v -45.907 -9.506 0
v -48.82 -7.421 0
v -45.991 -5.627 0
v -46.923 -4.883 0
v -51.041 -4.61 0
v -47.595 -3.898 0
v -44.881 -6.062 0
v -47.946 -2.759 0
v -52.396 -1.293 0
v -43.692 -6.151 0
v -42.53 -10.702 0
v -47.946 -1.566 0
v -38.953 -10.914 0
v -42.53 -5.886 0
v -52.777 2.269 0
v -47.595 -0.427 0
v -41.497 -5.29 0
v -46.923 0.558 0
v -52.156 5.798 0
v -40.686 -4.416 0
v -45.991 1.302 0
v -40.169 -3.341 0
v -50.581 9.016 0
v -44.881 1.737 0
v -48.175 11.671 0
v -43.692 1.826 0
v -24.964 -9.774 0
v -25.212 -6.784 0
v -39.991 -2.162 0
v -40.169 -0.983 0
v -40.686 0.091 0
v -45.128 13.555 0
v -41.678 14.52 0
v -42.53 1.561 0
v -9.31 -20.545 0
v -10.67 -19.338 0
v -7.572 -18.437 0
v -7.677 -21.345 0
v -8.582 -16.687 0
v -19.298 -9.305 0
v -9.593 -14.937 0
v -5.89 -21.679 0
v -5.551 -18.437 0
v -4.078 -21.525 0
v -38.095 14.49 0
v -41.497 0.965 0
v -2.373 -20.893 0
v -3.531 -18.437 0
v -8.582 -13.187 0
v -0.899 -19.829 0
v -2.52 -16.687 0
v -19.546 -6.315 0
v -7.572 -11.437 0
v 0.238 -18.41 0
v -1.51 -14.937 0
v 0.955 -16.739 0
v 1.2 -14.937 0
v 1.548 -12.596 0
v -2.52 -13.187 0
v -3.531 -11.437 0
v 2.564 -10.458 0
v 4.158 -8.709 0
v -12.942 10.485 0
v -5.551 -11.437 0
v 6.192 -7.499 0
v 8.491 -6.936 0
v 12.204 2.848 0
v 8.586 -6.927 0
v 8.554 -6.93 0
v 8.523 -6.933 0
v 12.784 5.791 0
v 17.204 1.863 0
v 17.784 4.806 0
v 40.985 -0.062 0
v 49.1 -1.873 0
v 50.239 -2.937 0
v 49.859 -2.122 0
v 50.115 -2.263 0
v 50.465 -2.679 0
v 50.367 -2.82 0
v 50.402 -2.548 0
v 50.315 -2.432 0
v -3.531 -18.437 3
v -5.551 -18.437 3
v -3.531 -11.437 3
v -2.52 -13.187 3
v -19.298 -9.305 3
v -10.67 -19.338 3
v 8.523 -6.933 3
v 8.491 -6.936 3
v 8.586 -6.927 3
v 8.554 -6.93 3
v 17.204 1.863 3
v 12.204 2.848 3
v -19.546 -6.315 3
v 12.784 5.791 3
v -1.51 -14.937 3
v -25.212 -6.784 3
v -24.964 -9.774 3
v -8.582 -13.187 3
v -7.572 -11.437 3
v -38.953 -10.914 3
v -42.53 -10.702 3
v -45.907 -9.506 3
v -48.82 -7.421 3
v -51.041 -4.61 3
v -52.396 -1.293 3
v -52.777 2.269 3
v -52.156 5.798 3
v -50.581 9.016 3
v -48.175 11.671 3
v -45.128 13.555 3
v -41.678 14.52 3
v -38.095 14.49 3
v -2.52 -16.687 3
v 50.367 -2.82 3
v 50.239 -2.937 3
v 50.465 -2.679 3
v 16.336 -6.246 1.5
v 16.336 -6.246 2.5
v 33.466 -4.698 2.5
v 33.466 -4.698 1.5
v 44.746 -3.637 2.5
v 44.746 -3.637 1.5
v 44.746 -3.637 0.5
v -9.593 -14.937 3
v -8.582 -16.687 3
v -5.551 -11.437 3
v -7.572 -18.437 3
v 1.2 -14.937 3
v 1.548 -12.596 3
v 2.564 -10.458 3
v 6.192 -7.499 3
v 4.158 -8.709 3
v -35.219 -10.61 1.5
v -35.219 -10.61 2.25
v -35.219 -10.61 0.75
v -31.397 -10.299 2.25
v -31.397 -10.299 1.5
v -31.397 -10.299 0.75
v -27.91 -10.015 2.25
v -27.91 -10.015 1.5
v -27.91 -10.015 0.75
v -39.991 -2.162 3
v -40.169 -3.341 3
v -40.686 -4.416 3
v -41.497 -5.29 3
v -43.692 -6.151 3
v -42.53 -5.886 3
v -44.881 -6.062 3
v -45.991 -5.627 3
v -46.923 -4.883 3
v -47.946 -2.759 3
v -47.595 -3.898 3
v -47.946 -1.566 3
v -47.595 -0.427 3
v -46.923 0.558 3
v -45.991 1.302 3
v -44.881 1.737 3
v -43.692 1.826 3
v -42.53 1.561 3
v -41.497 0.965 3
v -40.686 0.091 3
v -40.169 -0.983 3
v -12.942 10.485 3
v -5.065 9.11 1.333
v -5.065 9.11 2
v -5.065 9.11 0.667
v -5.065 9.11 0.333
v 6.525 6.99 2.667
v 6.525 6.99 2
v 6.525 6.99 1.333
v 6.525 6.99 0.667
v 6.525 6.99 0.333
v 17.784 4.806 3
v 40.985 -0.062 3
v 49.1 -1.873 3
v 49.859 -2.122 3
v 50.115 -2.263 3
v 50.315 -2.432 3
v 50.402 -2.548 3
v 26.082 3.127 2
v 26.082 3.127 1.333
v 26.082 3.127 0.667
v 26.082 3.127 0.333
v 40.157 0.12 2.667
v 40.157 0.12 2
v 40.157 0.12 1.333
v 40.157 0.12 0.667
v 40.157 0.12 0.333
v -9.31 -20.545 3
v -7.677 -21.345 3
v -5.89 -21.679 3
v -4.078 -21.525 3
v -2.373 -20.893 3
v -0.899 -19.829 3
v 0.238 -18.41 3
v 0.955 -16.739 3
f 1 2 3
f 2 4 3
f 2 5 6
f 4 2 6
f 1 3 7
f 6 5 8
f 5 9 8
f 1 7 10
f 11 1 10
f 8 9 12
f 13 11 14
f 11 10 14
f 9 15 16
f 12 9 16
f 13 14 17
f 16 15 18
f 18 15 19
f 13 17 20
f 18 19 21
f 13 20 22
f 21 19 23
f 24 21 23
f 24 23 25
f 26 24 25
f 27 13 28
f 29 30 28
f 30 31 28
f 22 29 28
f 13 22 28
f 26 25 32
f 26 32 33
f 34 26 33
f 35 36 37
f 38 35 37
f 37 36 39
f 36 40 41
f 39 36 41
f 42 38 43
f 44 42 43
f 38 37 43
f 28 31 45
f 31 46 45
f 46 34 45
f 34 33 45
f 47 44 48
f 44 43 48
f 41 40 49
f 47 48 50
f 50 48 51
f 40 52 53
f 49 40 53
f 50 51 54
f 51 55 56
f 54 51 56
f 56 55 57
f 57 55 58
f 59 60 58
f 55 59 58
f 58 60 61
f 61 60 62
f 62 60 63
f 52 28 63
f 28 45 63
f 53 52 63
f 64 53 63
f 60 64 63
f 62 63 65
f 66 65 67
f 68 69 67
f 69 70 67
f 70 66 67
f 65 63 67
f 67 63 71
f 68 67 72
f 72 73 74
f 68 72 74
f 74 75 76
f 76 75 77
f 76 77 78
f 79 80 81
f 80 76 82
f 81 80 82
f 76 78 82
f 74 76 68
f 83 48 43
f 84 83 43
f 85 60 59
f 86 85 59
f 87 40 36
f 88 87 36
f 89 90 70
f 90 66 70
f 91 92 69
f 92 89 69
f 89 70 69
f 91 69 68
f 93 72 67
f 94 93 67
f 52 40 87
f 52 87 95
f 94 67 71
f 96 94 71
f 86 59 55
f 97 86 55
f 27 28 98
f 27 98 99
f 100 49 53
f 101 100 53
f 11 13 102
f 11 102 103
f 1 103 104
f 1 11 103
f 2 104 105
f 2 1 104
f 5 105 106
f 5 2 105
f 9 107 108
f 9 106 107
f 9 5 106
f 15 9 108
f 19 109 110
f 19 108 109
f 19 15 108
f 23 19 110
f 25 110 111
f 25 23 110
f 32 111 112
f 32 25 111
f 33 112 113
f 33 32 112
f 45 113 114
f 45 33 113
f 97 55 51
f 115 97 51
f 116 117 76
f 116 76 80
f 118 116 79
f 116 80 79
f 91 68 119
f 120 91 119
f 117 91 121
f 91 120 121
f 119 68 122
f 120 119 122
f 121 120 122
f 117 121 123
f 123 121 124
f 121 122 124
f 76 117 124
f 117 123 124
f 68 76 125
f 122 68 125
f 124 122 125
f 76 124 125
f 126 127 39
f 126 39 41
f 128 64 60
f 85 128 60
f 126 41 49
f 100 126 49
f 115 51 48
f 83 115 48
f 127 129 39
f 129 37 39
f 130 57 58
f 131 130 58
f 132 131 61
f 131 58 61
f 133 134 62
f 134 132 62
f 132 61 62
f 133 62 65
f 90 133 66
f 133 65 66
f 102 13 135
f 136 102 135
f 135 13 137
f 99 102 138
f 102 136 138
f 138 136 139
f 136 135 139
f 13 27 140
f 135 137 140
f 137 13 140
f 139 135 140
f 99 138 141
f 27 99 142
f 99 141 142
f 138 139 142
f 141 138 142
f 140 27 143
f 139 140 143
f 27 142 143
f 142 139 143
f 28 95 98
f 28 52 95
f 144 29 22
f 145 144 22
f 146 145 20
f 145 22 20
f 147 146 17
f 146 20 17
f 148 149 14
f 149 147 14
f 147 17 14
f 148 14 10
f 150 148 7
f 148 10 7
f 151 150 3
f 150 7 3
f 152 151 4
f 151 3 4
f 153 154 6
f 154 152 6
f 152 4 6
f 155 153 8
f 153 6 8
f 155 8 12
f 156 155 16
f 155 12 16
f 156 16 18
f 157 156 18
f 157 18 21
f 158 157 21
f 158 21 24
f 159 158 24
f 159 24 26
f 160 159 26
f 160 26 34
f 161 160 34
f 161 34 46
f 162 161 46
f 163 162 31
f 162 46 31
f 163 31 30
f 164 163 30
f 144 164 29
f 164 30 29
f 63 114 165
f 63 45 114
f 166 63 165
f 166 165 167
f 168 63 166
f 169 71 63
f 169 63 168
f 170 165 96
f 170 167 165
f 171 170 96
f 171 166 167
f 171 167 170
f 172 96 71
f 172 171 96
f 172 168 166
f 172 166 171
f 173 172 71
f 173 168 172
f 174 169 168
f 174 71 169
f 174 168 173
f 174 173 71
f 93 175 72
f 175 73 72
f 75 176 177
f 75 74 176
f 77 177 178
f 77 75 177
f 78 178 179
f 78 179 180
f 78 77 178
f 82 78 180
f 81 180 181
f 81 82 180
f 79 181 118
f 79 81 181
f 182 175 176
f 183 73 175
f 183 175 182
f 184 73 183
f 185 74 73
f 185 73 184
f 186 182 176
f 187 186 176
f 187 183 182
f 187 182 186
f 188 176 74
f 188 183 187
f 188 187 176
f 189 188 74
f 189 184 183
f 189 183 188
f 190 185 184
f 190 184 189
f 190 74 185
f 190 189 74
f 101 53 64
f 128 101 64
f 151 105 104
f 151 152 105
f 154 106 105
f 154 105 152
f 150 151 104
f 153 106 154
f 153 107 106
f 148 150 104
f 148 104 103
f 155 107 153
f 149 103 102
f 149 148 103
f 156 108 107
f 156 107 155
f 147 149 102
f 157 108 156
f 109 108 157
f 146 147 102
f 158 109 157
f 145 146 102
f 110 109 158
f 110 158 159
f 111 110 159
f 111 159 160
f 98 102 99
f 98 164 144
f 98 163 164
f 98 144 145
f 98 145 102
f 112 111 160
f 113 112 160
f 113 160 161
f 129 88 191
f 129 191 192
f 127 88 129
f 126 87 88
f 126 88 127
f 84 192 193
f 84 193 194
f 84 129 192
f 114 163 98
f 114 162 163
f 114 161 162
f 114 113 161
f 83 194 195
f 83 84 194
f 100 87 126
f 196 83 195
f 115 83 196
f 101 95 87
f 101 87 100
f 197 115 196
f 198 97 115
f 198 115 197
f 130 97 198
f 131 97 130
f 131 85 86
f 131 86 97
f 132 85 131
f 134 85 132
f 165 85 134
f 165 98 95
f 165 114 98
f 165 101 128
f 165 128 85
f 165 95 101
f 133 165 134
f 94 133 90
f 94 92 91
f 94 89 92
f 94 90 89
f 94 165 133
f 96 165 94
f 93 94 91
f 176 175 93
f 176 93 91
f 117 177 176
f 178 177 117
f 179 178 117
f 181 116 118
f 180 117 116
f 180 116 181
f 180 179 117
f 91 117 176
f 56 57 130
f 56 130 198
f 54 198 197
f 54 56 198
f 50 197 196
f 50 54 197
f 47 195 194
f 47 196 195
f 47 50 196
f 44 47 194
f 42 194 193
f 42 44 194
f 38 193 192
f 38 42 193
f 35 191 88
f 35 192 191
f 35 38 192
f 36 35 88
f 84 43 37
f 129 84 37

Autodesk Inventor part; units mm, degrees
ref_plane "YZ Plane" through (0, 0, 0) normal (1, 0, 0) x (0, 1, 0)
ref_plane "XZ Plane" through (0, 0, 0) normal (0, 1, 0) x (-1, 0, 0)
ref_plane "XY Plane" through (0, 0, 0) normal (0, 0, 1) x (1, 0, 0)
sketch "Sketch1" plane through (0, 0, 0) normal (0, 0, 1) x (1, 0, 0)
  spline S0 degree 2 poles (-26.5248, 6.4808) (-26.4161, 6.4647) (-26.3074, 6.4486) knots 0 0 0 1 1 1
  line L0 (-26.3296, 6.4519) -> (-26.2853, 6.4453) construction
  arc A0 (-26.2897, 6.4459) -> (-26.3252, 6.4512) centre (-41.887, -98.3753) ccw construction
  line L1 (-25.2117, -6.7841) -> (-24.9641, -9.7739)
  line L2 (-24.9641, -9.7739) -> (-19.2983, -9.3048)
  line L3 (-19.2983, -9.3048) -> (-19.5458, -6.315)
  line L4 (12.2044, 2.8479) -> (12.7843, 5.7913)
  line L5 (17.2044, 1.8628) -> (12.2044, 2.8479)
  line L6 (17.7843, 4.8062) -> (17.2044, 1.8628)
  line L7 (12.7843, 5.7913) -> (17.7843, 4.8062)
  spline S1 degree 4 poles (-38.0951, 14.4901) (-32.9548, 13.7199) (-24.3789, 12.4143) (-13.058, 10.5436) (0.6417, 8.1052) (11.6287, 6.041) (21.387, 4.092) (29.8346, 2.3727) (36.815, 0.808) (43.6252, -0.5644) (47.6422, -1.771) (50.1605, -1.8369) (50.4649, -2.6789) knots 0 0 0 0 0 0.183688 0.302378 0.416104 0.523956 0.624947 0.717922 0.80148 0.87369 1 1 1 1 1
  line L8 (-19.5458, -6.315) -> (-25.2117, -6.7841)
  arc A1 (-38.0951, 14.4901) -> (-38.9531, -10.9139) centre (-39.9909, 1.8376) ccw
  line L9 (-39.9909, 1.8376) -> (-39.9909, -2.1624)
  line L10 (-39.9909, -2.1624) -> (-43.9909, -2.1624)
  circle A2 centre (-43.9909, -2.1624) radius 4
  arc A3 (-10.6702, -19.3385) -> (1.1997, -14.9369) centre (-5.5514, -14.9369) ccw
  circle A4 centre (-5.5514, -14.9369) radius 3.5
  line L11 (-19.2983, -9.3048) -> (-10.6702, -19.3385)
  arc A5 (8.586, -6.9273) -> (1.1997, -14.9369) centre (9.2356, -14.9369) ccw
  spline S2 degree 4 poles (-38.9531, -10.9139) (-33.23, -10.4482) (-24.9952, -9.78) (-22.9103, -9.6058) (-19.2983, -9.3048) knots 0 0 0 0 0 1 1 1 1 1
  spline S3 degree 4 poles (8.4911, -6.9355) (10.4946, -6.7611) (14.9368, -6.3715) (21.4309, -5.7906) (29.3954, -5.096) (36.4972, -4.392) (43.4136, -3.8797) (47.5475, -3.2083) (50.0497, -3.468) (50.4649, -2.6789) knots 0.442408 0.442408 0.442408 0.442408 0.442408 0.523404 0.624432 0.717481 0.801136 0.873452 1 1 1 1 1
  line L12 (-21.2865, -9.4705) -> (-17.3101, -9.139) construction
  arc A6 (-17.7077, -9.1723) -> (-20.8888, -9.4375) centre (811.3613, -9974.7453) ccw construction
  line L13 (3.8187, -7.3423) -> (13.1635, -6.5288) construction
  arc A7 (4.7531, -7.2593) -> (12.2289, -6.6085) centre (-354.4003, 4161.6553) ccw construction
  line L14 (-1.5099, -14.9369) -> (-3.5307, -18.4369)
  line L15 (-3.5307, -18.4369) -> (-7.5721, -18.4369)
  line L16 (-7.5721, -18.4369) -> (-9.5928, -14.9369)
  line L17 (-9.5928, -14.9369) -> (-7.5721, -11.4369)
  line L18 (-7.5721, -11.4369) -> (-3.5307, -11.4369)
  line L19 (-3.5307, -11.4369) -> (-1.5099, -14.9369)
  point P0 (0, 0)
  point P1 (-3.4702, -1.6741)
  point P2 (-11.7791, -8.6729)
  point P3 (0.4579, -7.6289)
  point P4 (30.1549, -5.0069)
  point P5 (37.3429, -4.3499)
  point P6 (43.0189, -3.8219)
  point P7 (47.1229, -3.4349)
  point P8 (49.6039, -3.1979)
  point P9 (-24.1061, 12.3331)
  point P10 (-10.9541, 10.1431)
  point P11 (1.2109, 7.9771)
  point P12 (12.2659, 5.8921)
  point P13 (22.0909, 3.9421)
  point P14 (30.5809, 2.1811)
  point P15 (37.6519, 0.6571)
  point P16 (43.2259, -0.5789)
  point P17 (47.2519, -1.4909)
  point P18 (49.6819, -2.0489)
  point P19 (-52.7771, 2.2732)
  point P20 (8.5548, -0.5944)
  point P21 (7.5624, -0.6892)
  point P22 (5.9208, -0.844)
  point P23 (3.6504, -1.0552)
  point P24 (0.7752, -1.318)
  point P25 (-2.6688, -1.6288)
  point P26 (-6.6432, -1.9804)
  point P27 (-11.1036, -2.3668)
  point P28 (-15.9984, -2.7844)
  point P29 (-21.2724, -3.2248)
  point P30 (8.586, -0.1348)
  point P31 (7.614, 0.0884)
  point P32 (6.0036, 0.4532)
  point P33 (3.774, 0.9476)
  point P34 (0.9456, 1.5572)
  point P35 (-2.4504, 2.2616)
  point P36 (-6.3804, 3.0416)
  point P37 (-10.8024, 3.8756)
  point P38 (-15.6684, 4.742)
  point P39 (-20.9292, 5.618)
  point P40 (8.8992, -0.3868)
  point P41 (-26.868, -3.6808)
  point P42 (49.6819, -2.6199)
  point P43 (47.2519, -2.4568)
  point P44 (43.2259, -2.1907)
  point P45 (37.6519, -1.832)
  point P46 (30.5809, -1.3934)
  point P47 (22.0909, -0.8963)
  point P48 (12.2659, -0.3564)
  point P49 (1.2109, 0.2067)
  point P50 (-10.9541, 0.7703)
  point P51 (-24.1061, 1.3154)
  point P52 (-38.0951, 1.823)
  point P53 (50.4649, -3.1199)
  point P54 (-53.5871, -12.0749)
  point P55 (-52.7771, 16.5571)
  point P56 (50.4649, -2.2379)
  point P57 (8.4911, -6.9355)
  dimension "d0" = 3
  dimension "d1" = 5
  dimension "d2" = 52.7751
  dimension "d3" = 3
  dimension "d4" = 5.6658
  dimension "d5" = 4
  dimension "d6" = 4
  dimension "d7" = 8
  dimension "d8" = 7
extrude "Extrusion2" add sketch "Sketch1" along normal blind 3 contours L1 S2 A1 S1 L4 L5 L6 S3 A5 A3 L11 L3 L8
properties part number "2P.03.01.07.JW.FlapRibMid" material "Wood (Walnut)"
